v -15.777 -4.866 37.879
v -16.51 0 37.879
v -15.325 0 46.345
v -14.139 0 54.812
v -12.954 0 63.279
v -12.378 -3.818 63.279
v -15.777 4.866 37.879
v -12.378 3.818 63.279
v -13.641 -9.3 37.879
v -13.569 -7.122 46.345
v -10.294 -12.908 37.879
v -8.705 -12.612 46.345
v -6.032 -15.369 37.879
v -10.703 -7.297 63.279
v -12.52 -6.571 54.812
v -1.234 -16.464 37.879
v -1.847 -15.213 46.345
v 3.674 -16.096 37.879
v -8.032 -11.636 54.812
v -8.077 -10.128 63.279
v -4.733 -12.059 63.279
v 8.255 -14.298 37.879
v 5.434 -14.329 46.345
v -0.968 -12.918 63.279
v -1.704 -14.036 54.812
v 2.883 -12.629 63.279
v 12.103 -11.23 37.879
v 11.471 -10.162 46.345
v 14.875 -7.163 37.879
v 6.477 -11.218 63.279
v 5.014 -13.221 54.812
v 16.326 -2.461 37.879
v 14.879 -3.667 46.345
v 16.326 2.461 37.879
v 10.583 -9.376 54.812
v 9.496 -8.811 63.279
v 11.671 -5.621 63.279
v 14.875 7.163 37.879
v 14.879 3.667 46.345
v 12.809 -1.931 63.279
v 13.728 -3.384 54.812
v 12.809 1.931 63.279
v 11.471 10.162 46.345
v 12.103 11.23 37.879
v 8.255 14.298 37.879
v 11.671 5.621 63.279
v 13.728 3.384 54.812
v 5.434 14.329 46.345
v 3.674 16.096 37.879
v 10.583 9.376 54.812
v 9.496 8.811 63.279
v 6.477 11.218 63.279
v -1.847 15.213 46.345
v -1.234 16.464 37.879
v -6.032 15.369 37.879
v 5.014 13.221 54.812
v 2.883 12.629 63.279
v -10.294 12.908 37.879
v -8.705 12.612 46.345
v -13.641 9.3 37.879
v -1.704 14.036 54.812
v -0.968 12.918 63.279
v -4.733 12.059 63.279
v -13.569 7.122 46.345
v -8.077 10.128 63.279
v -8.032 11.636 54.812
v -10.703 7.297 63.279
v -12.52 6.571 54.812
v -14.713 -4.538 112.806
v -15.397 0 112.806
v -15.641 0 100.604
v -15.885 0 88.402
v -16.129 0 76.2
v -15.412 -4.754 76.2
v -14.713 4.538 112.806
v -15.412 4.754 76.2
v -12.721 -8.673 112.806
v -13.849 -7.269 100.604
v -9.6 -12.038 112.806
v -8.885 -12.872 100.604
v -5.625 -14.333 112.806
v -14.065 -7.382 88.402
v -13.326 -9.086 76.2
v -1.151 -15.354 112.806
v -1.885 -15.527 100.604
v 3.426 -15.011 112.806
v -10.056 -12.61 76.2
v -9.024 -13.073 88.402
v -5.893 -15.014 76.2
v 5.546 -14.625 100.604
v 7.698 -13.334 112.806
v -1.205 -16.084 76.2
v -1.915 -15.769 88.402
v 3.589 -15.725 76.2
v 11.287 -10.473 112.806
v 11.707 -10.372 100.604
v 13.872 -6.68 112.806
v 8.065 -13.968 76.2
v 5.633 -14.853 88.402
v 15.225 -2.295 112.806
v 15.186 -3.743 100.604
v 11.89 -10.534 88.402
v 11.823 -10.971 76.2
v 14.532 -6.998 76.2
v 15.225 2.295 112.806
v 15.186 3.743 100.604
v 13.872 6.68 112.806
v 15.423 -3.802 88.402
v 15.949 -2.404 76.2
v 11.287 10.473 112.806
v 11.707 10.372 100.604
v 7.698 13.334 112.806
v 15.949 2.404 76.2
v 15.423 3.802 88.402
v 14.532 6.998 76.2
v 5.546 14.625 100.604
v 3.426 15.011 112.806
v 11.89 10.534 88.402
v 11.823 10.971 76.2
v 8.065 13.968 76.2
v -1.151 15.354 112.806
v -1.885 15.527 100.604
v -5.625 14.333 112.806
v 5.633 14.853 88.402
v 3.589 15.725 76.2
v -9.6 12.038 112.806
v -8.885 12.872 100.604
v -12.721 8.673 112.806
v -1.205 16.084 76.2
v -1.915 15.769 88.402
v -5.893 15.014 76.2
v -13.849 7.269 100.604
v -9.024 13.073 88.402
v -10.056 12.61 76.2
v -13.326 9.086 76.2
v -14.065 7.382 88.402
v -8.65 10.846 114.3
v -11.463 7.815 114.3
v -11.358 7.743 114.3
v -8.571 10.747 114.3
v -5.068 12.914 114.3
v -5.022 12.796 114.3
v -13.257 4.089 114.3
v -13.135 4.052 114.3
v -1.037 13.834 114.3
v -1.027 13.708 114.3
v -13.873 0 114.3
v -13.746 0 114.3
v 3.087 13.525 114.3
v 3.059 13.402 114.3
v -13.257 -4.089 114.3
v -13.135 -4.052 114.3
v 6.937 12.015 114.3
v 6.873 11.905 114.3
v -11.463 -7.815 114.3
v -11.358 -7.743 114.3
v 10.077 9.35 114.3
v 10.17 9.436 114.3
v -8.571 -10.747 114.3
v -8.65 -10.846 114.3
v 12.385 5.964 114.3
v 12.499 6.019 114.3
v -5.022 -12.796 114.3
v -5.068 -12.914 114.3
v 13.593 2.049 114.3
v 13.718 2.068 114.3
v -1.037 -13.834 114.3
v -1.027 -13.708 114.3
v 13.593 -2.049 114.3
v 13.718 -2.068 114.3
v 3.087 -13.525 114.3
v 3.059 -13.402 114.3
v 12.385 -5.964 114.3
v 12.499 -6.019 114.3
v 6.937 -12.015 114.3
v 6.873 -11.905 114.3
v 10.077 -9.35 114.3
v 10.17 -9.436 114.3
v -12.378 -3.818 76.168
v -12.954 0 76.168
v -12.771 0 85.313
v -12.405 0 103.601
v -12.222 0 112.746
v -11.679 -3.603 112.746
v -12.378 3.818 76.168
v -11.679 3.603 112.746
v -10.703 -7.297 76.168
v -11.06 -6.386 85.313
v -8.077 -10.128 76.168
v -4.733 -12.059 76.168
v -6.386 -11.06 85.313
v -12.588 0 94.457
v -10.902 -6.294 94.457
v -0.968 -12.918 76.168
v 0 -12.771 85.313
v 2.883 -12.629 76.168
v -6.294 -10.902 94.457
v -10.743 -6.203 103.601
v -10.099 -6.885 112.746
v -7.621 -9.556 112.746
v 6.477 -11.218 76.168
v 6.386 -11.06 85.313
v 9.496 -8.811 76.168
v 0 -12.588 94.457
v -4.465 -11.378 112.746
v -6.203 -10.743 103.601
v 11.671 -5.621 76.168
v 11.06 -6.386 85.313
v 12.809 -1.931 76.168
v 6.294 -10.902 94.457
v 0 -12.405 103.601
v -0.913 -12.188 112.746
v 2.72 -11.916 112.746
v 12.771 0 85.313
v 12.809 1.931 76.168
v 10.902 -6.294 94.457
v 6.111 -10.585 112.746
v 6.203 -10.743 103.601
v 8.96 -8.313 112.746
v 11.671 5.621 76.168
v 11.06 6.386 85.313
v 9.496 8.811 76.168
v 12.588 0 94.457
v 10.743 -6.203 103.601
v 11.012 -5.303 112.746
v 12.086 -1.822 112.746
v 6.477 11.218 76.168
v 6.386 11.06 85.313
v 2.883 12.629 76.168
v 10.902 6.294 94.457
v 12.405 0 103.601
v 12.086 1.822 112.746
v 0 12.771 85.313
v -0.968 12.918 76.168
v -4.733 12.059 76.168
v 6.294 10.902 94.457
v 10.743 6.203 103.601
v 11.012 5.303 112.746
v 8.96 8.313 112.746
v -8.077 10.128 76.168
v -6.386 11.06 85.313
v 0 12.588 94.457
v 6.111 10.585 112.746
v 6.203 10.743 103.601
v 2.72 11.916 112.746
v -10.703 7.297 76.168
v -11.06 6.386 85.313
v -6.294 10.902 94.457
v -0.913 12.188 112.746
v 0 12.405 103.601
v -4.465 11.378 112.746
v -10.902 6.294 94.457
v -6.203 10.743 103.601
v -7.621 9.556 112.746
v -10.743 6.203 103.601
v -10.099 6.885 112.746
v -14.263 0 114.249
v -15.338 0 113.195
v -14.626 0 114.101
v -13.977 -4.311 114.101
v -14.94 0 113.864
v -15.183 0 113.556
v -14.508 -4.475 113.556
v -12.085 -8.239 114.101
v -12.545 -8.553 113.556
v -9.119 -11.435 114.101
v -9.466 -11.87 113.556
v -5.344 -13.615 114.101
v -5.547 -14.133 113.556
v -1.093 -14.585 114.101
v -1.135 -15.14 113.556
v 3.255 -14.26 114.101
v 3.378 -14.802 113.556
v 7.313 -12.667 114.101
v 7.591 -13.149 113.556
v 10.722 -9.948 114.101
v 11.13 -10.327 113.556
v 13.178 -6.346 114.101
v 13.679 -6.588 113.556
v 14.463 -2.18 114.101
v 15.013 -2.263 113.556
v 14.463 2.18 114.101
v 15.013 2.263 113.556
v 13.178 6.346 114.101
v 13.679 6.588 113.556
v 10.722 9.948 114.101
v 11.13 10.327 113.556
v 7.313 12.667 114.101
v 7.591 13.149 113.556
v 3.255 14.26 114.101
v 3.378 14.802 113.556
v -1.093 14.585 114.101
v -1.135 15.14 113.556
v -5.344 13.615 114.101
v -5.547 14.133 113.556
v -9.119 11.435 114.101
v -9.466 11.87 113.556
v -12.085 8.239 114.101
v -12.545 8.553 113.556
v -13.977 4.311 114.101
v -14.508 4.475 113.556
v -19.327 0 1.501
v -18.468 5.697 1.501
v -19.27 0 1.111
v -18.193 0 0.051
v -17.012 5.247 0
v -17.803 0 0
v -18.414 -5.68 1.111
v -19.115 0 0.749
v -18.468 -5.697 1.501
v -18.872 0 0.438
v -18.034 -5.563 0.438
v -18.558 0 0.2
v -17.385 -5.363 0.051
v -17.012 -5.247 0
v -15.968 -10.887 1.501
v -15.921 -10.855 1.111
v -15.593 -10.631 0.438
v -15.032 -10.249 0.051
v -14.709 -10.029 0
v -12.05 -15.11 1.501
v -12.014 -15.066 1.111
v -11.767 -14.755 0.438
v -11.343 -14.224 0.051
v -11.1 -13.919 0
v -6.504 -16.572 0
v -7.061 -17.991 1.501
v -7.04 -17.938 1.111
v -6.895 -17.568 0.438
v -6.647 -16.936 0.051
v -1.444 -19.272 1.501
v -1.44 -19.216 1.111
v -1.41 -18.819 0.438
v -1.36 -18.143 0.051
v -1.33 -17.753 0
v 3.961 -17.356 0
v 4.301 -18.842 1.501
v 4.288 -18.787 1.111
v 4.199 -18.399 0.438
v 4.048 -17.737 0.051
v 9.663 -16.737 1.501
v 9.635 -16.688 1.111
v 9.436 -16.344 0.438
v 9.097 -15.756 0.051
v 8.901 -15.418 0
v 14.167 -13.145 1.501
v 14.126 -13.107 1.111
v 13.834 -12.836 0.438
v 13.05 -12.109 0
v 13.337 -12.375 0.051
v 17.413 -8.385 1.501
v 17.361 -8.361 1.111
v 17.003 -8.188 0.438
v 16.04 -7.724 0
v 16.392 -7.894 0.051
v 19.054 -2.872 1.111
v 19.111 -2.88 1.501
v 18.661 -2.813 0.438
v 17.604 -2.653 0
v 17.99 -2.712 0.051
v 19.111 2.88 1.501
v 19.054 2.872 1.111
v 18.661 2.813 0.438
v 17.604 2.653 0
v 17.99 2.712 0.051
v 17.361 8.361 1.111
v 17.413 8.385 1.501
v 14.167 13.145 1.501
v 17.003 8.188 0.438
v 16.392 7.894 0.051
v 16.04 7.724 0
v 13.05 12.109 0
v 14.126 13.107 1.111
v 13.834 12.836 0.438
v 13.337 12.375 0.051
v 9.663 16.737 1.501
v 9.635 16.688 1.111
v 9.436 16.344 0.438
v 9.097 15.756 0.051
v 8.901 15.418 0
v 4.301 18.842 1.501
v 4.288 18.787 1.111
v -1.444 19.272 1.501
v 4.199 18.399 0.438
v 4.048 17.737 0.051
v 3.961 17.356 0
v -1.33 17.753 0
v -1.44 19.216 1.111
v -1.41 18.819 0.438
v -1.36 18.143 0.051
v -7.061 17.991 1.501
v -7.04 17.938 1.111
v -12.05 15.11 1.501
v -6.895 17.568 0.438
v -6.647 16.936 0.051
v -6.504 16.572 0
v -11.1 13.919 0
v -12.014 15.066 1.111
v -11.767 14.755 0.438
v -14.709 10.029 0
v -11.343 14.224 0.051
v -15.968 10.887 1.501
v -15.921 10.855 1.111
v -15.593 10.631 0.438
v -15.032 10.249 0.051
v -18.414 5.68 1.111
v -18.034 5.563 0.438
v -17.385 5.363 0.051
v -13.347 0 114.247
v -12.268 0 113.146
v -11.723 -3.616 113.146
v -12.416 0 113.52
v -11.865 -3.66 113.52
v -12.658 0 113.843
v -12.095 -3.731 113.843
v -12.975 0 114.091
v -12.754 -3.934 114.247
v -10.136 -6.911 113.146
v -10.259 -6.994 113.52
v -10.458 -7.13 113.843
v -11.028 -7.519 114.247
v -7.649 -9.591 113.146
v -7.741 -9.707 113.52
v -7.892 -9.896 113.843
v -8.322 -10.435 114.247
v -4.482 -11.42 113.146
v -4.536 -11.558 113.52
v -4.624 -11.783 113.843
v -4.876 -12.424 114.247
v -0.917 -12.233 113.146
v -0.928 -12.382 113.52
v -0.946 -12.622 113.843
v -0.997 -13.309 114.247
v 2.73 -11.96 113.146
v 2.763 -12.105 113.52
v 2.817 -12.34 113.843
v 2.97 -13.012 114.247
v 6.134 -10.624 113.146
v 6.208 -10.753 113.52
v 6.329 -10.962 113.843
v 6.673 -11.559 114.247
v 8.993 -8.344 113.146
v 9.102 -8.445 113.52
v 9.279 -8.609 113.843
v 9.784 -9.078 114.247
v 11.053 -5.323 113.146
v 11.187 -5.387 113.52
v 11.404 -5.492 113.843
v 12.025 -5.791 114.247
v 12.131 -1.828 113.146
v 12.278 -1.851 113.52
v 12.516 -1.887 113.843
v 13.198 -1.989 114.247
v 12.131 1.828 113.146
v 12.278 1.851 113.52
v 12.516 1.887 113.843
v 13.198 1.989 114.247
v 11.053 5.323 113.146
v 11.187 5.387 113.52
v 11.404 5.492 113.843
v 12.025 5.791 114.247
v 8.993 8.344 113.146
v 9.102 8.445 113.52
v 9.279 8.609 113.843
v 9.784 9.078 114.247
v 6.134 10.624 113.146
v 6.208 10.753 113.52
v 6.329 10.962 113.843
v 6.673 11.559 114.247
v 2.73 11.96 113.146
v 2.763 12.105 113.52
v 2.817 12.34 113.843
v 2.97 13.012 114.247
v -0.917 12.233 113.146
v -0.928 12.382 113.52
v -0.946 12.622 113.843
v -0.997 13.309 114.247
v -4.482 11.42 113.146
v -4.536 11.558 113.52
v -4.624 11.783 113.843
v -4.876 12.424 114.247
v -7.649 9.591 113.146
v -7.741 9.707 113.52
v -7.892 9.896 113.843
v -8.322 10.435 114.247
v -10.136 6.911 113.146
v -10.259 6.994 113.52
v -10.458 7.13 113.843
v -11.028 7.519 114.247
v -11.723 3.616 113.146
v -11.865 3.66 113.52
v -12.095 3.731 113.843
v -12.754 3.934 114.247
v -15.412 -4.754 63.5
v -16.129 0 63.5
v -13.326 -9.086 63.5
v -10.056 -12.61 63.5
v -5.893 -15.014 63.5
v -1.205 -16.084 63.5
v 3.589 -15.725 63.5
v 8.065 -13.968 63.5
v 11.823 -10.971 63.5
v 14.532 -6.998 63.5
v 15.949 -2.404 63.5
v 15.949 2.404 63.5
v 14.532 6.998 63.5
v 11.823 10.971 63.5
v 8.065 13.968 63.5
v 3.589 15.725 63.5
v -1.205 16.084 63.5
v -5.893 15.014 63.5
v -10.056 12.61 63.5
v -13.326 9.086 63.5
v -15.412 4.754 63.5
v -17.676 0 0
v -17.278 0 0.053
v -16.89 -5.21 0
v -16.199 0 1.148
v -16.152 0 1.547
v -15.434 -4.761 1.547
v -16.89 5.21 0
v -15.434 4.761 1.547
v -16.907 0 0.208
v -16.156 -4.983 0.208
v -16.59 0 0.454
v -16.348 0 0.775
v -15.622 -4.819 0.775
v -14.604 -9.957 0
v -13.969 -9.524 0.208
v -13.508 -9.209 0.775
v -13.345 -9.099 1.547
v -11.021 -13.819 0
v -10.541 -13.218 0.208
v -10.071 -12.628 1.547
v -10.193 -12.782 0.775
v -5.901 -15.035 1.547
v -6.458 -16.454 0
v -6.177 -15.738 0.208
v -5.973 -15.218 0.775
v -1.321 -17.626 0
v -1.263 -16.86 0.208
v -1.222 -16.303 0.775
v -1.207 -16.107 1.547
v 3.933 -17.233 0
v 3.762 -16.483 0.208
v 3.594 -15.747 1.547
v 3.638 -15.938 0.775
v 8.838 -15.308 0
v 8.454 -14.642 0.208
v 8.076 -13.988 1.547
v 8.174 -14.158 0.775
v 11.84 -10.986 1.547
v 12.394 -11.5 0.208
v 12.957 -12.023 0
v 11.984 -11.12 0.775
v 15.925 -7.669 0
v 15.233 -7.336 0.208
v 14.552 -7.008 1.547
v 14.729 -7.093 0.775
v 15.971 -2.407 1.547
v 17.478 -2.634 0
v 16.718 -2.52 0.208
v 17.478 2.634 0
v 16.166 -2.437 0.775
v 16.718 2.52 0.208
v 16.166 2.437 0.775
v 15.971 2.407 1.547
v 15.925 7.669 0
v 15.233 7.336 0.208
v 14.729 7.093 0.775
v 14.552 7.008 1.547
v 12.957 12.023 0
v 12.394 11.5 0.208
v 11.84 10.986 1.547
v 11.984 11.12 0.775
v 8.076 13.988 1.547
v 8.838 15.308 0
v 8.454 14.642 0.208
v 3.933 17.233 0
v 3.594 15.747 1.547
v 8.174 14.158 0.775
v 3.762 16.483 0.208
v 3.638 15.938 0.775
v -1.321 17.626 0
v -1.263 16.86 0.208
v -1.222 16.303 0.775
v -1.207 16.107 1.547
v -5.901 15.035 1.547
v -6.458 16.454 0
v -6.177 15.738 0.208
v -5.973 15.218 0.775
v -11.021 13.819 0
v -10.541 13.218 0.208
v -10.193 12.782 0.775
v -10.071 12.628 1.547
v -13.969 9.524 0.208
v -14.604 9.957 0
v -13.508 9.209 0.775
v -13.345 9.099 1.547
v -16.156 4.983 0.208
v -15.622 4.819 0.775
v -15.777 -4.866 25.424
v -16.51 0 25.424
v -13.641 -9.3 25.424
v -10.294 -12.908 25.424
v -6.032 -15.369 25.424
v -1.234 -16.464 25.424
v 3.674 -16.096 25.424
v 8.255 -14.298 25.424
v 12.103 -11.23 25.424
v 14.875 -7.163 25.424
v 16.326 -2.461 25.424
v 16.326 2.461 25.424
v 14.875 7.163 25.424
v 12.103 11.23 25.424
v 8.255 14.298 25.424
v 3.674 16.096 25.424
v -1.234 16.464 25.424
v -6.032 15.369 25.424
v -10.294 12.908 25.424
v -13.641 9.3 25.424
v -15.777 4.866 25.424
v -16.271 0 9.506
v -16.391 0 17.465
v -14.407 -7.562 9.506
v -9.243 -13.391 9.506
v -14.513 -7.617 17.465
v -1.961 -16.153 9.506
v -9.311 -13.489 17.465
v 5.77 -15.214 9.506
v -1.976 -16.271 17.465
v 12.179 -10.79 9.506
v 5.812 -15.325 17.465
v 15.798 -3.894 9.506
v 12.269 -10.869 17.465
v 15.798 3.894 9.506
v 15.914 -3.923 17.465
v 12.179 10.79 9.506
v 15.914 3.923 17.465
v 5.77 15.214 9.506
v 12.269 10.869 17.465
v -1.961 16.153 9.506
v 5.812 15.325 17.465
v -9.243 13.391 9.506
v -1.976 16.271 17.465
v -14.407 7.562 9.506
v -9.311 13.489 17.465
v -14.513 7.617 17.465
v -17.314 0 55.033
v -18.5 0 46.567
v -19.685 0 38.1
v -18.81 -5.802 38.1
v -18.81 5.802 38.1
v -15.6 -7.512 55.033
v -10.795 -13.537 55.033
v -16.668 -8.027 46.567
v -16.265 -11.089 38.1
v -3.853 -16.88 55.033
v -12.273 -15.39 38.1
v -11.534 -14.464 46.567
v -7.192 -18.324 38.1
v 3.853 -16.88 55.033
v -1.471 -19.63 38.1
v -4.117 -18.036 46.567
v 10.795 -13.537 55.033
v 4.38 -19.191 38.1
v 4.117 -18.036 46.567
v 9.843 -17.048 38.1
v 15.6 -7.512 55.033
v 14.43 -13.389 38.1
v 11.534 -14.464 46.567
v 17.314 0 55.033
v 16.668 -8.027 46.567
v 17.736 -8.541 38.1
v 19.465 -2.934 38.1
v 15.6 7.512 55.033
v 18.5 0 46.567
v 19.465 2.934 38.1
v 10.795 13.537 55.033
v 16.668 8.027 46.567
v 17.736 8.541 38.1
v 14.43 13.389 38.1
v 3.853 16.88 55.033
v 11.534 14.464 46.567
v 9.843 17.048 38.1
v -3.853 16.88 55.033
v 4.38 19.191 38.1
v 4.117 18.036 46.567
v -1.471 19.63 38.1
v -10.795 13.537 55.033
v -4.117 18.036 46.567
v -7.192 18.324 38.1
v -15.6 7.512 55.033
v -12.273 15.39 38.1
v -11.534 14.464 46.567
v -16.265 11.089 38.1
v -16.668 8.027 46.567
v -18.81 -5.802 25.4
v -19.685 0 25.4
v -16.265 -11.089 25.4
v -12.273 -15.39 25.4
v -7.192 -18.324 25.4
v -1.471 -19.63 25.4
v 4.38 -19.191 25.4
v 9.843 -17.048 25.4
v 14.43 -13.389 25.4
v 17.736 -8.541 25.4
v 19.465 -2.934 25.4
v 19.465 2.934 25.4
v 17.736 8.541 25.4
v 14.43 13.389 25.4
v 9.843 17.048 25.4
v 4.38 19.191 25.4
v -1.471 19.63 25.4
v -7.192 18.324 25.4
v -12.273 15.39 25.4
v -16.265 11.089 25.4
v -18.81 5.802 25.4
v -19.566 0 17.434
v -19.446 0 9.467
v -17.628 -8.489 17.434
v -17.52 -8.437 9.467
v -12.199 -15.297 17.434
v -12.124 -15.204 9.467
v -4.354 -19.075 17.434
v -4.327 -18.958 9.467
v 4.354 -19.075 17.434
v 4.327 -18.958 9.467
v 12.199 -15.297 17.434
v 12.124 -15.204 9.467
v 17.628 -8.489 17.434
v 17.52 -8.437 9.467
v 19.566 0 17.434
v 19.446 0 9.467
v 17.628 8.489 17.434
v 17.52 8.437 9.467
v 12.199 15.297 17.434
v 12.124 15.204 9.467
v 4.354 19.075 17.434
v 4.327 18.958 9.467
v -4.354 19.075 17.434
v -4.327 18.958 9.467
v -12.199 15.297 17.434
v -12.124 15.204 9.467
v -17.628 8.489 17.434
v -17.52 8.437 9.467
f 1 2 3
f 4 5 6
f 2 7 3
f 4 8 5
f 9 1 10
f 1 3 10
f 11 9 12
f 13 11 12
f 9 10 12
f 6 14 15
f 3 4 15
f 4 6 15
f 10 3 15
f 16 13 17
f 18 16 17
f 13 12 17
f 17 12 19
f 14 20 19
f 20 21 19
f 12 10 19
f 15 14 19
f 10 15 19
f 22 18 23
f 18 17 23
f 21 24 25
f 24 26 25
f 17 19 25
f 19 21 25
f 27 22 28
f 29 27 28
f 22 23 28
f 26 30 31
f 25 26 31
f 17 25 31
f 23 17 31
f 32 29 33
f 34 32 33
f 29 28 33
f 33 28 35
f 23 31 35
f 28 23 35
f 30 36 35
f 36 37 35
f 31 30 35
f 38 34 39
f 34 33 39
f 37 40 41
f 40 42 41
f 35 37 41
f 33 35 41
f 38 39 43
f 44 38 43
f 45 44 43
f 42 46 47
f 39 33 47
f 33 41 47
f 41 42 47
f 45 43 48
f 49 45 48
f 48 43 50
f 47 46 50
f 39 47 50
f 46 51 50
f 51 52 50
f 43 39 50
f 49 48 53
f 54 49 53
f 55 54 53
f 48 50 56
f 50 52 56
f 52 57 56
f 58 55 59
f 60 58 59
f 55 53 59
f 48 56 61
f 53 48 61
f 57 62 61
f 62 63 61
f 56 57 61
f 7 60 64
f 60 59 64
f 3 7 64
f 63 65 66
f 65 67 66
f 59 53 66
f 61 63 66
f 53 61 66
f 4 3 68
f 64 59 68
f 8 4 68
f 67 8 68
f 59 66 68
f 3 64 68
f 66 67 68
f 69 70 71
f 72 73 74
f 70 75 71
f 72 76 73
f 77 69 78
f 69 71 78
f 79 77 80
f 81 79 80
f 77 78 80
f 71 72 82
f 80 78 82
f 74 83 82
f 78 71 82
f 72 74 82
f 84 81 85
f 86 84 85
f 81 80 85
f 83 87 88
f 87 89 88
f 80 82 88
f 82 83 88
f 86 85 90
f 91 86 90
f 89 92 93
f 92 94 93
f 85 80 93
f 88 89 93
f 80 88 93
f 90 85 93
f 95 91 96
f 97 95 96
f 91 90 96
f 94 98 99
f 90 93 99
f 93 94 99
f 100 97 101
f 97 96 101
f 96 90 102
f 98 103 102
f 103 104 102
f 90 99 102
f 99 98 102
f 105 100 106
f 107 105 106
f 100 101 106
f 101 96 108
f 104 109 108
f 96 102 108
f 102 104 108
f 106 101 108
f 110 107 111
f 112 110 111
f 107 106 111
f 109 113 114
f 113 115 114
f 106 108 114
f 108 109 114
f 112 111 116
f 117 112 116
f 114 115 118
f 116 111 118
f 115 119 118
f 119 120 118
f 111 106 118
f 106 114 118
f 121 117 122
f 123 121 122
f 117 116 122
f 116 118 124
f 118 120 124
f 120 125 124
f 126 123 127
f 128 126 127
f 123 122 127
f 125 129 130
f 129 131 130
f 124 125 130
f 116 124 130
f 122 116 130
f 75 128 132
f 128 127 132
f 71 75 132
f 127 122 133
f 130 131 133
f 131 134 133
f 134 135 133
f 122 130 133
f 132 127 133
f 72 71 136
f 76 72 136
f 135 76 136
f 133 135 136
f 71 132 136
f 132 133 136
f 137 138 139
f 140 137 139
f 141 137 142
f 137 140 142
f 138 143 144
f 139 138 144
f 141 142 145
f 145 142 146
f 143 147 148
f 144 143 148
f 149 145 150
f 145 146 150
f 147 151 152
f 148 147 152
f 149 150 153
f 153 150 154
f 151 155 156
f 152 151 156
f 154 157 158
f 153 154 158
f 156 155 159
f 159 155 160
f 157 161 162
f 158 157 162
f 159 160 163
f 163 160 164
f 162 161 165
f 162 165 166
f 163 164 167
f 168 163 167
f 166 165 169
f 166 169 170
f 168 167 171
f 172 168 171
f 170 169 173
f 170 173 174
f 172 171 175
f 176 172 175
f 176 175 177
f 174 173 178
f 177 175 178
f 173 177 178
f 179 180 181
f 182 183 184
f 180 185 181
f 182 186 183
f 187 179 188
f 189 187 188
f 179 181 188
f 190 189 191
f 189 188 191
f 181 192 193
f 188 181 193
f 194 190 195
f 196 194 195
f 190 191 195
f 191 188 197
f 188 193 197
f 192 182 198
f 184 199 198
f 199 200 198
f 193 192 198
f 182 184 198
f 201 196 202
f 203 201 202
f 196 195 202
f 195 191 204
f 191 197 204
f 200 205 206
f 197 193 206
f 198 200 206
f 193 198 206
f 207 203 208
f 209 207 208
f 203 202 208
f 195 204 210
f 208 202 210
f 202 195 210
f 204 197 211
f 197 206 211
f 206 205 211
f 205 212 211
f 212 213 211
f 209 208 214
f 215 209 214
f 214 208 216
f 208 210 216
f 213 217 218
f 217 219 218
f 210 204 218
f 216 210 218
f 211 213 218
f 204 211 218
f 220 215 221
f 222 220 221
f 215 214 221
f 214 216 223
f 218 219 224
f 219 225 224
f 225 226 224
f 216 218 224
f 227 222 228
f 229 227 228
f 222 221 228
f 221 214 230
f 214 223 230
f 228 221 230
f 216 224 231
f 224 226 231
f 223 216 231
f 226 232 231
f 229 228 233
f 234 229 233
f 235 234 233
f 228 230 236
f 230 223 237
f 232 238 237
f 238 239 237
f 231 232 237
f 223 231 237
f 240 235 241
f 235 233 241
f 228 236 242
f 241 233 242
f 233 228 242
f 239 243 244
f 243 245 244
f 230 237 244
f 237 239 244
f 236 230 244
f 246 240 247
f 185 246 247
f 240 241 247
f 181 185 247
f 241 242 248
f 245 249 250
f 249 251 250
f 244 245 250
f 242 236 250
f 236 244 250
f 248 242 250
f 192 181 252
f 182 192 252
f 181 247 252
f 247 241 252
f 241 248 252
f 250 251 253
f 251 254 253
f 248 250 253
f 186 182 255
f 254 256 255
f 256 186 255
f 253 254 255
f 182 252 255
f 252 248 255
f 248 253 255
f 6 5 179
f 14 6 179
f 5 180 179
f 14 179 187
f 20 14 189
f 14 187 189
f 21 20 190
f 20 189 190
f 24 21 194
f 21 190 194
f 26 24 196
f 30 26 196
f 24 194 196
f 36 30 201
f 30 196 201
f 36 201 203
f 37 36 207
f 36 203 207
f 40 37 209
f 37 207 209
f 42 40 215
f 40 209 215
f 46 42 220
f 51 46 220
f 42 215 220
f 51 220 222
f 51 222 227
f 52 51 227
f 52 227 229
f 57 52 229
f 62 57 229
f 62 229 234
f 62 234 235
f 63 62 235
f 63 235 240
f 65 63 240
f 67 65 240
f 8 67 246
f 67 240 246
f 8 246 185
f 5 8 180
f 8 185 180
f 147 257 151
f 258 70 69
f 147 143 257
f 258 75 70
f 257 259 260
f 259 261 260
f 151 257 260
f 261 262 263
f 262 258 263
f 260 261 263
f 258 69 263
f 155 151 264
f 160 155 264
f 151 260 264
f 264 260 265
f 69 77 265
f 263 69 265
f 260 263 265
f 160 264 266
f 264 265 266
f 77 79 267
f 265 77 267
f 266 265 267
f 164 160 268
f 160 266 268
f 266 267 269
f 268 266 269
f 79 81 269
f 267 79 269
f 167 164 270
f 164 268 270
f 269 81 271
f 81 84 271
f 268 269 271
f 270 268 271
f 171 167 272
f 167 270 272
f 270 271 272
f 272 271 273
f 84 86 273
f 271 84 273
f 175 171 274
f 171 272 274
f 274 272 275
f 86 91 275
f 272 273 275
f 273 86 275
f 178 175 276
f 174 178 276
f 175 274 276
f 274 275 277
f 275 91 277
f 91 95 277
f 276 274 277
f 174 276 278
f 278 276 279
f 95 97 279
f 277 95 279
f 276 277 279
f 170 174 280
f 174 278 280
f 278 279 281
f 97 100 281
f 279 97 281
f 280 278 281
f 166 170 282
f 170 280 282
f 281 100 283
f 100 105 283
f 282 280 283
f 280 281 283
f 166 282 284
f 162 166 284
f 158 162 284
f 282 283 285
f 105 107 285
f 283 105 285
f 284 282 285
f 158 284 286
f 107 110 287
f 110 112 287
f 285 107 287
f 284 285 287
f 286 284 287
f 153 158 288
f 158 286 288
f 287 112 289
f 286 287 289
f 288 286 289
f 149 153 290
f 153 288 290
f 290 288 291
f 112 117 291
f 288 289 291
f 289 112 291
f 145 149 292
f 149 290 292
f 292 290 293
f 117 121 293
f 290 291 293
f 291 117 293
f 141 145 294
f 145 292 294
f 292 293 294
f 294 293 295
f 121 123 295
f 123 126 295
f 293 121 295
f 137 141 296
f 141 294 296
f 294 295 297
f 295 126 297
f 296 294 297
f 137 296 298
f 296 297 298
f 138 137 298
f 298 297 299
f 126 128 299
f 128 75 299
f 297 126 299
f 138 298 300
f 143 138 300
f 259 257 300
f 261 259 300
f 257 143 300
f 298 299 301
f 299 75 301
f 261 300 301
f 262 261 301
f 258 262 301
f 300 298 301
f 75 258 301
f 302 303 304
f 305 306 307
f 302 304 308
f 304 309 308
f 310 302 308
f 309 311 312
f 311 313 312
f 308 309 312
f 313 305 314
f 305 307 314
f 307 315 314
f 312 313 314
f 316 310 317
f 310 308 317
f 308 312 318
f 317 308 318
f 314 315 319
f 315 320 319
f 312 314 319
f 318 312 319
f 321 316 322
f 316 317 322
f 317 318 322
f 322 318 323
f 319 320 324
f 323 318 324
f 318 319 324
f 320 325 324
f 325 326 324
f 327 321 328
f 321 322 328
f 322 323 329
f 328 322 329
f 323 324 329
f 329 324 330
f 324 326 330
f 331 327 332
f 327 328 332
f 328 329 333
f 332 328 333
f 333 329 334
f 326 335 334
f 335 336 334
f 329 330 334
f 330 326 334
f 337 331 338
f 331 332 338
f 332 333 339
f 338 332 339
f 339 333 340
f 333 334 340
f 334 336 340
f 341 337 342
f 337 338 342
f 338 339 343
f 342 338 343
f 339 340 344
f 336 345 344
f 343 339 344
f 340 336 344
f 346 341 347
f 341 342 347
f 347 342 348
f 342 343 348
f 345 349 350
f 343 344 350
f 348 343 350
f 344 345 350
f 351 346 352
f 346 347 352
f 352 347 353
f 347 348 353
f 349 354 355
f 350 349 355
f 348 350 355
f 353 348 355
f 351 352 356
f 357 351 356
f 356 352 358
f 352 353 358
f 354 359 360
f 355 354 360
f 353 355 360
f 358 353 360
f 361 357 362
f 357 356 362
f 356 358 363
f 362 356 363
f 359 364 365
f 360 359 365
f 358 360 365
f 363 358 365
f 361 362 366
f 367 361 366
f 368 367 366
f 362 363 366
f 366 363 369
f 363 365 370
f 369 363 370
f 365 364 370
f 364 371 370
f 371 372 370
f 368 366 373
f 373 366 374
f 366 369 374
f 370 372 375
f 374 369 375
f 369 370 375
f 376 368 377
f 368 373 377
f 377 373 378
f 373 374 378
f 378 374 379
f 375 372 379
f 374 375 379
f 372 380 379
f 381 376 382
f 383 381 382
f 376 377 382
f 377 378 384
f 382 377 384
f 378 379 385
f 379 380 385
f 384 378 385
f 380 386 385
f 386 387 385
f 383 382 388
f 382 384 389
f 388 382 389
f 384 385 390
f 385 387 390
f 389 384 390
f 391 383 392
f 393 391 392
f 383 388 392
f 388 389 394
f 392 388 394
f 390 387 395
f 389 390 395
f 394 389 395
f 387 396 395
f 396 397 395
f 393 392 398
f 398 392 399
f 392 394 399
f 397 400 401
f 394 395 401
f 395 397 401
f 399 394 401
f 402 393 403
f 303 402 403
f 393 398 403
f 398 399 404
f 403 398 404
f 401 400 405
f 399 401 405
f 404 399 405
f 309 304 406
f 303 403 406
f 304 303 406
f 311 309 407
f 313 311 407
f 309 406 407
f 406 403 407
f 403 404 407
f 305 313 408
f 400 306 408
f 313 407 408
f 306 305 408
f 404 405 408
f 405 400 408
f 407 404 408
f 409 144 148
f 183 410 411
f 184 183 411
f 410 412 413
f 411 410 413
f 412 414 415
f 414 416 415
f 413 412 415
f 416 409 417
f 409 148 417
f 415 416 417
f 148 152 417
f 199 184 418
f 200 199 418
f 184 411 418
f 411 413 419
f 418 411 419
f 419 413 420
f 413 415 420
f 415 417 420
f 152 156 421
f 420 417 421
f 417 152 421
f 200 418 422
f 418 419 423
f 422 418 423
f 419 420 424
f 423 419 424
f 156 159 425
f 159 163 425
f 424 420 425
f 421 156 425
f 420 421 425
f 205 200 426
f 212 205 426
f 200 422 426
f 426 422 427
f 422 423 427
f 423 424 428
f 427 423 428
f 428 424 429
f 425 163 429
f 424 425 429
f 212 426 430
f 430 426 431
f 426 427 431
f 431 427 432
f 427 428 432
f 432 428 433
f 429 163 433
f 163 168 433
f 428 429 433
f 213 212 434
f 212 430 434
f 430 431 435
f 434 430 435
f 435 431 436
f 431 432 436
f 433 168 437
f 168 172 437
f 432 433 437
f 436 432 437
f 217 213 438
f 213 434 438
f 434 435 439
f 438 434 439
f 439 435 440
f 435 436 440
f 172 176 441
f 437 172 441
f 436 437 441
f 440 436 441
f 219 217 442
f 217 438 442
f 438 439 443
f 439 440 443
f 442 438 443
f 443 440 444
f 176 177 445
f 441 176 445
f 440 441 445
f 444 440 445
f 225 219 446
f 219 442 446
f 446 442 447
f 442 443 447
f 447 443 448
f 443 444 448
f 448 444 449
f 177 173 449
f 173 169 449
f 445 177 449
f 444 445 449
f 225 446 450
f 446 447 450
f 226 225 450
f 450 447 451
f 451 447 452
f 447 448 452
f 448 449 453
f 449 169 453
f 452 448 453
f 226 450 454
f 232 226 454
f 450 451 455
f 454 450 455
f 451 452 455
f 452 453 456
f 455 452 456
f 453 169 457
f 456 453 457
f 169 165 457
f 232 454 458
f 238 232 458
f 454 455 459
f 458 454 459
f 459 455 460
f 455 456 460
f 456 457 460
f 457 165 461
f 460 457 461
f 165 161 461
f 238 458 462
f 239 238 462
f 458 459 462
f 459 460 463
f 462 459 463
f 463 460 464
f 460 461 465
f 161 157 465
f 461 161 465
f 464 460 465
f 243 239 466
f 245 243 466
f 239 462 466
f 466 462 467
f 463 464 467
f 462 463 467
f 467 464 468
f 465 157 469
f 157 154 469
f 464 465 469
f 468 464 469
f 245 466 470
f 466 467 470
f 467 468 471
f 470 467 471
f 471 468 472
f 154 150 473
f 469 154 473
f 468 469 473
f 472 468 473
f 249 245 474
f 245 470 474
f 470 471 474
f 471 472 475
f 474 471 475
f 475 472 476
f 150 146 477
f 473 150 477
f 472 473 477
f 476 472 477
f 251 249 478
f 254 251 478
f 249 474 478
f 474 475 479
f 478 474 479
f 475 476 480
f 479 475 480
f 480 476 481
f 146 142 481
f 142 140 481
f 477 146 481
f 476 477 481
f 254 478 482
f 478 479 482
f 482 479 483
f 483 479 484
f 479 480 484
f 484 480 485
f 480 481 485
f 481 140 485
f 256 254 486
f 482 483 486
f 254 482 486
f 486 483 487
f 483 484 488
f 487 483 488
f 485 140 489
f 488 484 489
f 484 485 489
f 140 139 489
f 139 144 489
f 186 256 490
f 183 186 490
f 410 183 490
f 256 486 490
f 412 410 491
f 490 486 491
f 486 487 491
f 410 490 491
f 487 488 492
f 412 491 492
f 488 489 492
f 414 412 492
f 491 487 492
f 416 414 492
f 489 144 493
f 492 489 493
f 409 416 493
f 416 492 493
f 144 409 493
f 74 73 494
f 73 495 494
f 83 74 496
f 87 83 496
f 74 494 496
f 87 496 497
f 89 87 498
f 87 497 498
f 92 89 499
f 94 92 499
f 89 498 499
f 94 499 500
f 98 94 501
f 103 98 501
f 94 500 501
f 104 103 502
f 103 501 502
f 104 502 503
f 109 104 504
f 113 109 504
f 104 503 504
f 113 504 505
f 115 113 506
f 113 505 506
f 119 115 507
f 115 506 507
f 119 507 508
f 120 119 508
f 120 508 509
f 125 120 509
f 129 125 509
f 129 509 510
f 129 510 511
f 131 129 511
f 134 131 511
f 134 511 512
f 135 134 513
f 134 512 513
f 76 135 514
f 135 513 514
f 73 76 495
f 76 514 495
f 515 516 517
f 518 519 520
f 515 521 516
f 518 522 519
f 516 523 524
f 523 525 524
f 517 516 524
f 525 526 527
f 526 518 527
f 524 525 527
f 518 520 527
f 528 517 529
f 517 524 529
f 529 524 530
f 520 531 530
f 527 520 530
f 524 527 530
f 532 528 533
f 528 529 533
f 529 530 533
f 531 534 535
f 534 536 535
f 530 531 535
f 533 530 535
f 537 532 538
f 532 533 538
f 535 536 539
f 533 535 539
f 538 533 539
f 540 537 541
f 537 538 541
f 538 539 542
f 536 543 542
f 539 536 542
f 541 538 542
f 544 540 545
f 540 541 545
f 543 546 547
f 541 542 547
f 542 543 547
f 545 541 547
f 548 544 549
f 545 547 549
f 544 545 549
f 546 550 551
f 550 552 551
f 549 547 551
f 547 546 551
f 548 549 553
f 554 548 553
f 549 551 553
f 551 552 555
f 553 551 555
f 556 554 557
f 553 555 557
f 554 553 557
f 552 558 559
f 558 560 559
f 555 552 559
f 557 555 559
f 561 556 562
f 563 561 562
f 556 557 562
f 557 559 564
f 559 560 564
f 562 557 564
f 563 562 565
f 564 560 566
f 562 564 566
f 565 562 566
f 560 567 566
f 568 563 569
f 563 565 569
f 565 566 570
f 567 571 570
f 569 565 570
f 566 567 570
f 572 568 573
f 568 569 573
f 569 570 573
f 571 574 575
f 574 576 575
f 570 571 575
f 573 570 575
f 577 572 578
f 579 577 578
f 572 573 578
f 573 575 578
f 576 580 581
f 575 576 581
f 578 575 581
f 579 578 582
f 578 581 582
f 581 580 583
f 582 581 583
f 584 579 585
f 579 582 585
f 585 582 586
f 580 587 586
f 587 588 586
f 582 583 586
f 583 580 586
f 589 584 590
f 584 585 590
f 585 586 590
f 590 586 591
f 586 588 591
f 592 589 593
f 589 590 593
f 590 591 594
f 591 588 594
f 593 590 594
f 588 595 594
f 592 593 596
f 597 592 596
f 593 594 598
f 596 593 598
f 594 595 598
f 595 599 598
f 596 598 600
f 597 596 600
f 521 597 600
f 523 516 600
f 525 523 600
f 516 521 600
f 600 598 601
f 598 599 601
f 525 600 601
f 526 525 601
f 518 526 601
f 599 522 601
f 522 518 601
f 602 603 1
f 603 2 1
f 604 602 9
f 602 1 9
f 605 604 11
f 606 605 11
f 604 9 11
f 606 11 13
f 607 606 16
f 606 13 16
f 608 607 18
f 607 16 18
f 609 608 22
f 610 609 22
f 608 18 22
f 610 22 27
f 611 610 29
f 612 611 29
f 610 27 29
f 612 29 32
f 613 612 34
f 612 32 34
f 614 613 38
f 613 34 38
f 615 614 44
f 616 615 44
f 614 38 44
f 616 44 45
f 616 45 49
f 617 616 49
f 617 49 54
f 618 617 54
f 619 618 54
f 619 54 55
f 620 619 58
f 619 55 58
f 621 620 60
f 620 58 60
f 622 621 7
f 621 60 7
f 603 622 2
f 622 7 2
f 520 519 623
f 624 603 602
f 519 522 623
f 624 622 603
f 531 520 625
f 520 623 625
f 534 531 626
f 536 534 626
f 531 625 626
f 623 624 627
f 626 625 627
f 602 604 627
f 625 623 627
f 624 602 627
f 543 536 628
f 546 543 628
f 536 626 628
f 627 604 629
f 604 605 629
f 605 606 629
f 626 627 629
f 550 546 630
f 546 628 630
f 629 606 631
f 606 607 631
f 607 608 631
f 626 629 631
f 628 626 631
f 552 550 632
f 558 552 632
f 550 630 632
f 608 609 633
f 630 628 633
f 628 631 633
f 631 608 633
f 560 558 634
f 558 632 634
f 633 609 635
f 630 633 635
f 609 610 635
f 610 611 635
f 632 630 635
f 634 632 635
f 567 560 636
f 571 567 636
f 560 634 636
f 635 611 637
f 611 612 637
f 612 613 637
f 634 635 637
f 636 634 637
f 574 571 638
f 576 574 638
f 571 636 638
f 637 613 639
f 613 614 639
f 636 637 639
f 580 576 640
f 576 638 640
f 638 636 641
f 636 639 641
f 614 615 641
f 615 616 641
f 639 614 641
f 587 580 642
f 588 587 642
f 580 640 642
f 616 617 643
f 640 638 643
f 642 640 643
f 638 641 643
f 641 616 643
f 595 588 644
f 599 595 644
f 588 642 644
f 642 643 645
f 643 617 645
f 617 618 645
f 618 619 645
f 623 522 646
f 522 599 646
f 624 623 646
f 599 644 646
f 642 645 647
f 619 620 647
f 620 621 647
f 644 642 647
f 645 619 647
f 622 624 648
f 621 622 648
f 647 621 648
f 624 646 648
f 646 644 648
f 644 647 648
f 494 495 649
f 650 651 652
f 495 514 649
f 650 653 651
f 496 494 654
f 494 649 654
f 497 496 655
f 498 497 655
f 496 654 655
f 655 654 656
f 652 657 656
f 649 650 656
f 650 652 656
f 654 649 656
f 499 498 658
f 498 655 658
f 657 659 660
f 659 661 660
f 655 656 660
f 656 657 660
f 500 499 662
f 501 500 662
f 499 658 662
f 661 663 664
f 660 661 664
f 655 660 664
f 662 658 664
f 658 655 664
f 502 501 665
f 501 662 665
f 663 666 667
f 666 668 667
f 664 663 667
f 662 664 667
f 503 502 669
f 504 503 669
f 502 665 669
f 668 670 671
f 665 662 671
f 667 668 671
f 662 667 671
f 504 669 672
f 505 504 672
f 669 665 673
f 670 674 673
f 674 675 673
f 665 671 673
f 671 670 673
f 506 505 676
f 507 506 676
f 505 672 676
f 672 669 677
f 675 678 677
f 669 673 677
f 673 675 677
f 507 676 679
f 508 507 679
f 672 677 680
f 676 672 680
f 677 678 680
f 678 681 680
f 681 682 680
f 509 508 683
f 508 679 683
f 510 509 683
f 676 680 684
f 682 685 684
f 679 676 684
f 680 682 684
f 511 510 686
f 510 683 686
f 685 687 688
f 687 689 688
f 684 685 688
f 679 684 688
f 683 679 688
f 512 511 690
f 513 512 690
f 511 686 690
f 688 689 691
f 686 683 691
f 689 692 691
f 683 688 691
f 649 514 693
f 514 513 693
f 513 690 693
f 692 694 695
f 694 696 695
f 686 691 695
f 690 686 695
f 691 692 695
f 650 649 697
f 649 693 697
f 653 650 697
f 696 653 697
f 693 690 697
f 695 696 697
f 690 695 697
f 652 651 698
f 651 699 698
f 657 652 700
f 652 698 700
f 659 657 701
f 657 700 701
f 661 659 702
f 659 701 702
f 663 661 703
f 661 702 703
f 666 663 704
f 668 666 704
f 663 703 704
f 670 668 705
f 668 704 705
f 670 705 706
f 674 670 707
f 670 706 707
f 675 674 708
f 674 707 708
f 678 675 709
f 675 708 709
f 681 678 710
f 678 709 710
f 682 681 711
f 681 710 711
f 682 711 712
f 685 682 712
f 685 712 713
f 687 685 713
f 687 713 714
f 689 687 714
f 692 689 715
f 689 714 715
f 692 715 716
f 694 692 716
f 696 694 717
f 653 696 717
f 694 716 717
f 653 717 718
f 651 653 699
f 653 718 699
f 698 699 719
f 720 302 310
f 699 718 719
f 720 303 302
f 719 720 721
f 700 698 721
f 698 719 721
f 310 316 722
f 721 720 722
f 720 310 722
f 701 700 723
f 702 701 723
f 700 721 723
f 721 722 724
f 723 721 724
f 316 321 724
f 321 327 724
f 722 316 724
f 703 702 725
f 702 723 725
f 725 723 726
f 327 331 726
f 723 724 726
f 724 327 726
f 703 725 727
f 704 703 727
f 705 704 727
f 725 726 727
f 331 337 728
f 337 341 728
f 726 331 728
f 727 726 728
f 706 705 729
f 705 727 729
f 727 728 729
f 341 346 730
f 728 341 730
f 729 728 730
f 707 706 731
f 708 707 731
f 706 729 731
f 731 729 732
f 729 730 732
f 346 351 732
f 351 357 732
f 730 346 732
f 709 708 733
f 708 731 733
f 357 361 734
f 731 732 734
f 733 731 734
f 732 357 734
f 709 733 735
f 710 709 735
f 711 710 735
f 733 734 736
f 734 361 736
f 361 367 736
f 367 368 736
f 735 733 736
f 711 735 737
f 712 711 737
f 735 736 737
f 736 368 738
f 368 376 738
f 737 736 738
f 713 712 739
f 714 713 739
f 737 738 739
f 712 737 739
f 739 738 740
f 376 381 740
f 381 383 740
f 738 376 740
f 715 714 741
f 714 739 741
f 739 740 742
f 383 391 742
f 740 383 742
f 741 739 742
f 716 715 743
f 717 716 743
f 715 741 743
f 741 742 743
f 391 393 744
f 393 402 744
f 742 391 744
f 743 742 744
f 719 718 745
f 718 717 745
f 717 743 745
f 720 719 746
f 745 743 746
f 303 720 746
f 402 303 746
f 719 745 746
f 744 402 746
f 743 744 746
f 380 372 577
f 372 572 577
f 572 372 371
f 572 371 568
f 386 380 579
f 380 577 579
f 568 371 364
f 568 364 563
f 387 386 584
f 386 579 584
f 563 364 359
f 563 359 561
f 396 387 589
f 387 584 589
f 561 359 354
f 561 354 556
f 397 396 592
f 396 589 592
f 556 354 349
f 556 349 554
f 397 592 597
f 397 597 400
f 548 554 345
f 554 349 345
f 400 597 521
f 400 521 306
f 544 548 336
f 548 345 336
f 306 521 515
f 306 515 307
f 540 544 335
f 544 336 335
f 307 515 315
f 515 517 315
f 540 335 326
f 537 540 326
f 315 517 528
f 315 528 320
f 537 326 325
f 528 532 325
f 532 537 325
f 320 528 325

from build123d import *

# Parameters (mm, degrees)
F2_R = 1.524


with BuildPart() as f1:
    # F0 (on Front) → F1 (revolve)
    with BuildSketch(Plane.XZ):
        Polygon((-19.685, 25.4), (-19.304, 0), (-16.128643, 0), (-16.51, 25.423811), (-16.51, 37.878828), (-12.954, 63.278828), (-12.954, 76.168253), (-12.191365, 114.3), (-15.367, 114.3), (-16.129, 76.2), (-16.129, 63.5), (-19.685, 38.1), align=None)
    revolve(axis=Axis((0, 0, 60.50895), (0, 0, 1)))

    # F2
    f2_edges = [f1.edges().sort_by_distance(p)[0] for p in [
        (15.367, 0, 114.3),
        (12.191365, 0, 114.3),
        (19.304, 0, 0),
        (16.128643, 0, 0),
    ]]
    fillet(f2_edges, radius=F2_R)


solid = f1.part
